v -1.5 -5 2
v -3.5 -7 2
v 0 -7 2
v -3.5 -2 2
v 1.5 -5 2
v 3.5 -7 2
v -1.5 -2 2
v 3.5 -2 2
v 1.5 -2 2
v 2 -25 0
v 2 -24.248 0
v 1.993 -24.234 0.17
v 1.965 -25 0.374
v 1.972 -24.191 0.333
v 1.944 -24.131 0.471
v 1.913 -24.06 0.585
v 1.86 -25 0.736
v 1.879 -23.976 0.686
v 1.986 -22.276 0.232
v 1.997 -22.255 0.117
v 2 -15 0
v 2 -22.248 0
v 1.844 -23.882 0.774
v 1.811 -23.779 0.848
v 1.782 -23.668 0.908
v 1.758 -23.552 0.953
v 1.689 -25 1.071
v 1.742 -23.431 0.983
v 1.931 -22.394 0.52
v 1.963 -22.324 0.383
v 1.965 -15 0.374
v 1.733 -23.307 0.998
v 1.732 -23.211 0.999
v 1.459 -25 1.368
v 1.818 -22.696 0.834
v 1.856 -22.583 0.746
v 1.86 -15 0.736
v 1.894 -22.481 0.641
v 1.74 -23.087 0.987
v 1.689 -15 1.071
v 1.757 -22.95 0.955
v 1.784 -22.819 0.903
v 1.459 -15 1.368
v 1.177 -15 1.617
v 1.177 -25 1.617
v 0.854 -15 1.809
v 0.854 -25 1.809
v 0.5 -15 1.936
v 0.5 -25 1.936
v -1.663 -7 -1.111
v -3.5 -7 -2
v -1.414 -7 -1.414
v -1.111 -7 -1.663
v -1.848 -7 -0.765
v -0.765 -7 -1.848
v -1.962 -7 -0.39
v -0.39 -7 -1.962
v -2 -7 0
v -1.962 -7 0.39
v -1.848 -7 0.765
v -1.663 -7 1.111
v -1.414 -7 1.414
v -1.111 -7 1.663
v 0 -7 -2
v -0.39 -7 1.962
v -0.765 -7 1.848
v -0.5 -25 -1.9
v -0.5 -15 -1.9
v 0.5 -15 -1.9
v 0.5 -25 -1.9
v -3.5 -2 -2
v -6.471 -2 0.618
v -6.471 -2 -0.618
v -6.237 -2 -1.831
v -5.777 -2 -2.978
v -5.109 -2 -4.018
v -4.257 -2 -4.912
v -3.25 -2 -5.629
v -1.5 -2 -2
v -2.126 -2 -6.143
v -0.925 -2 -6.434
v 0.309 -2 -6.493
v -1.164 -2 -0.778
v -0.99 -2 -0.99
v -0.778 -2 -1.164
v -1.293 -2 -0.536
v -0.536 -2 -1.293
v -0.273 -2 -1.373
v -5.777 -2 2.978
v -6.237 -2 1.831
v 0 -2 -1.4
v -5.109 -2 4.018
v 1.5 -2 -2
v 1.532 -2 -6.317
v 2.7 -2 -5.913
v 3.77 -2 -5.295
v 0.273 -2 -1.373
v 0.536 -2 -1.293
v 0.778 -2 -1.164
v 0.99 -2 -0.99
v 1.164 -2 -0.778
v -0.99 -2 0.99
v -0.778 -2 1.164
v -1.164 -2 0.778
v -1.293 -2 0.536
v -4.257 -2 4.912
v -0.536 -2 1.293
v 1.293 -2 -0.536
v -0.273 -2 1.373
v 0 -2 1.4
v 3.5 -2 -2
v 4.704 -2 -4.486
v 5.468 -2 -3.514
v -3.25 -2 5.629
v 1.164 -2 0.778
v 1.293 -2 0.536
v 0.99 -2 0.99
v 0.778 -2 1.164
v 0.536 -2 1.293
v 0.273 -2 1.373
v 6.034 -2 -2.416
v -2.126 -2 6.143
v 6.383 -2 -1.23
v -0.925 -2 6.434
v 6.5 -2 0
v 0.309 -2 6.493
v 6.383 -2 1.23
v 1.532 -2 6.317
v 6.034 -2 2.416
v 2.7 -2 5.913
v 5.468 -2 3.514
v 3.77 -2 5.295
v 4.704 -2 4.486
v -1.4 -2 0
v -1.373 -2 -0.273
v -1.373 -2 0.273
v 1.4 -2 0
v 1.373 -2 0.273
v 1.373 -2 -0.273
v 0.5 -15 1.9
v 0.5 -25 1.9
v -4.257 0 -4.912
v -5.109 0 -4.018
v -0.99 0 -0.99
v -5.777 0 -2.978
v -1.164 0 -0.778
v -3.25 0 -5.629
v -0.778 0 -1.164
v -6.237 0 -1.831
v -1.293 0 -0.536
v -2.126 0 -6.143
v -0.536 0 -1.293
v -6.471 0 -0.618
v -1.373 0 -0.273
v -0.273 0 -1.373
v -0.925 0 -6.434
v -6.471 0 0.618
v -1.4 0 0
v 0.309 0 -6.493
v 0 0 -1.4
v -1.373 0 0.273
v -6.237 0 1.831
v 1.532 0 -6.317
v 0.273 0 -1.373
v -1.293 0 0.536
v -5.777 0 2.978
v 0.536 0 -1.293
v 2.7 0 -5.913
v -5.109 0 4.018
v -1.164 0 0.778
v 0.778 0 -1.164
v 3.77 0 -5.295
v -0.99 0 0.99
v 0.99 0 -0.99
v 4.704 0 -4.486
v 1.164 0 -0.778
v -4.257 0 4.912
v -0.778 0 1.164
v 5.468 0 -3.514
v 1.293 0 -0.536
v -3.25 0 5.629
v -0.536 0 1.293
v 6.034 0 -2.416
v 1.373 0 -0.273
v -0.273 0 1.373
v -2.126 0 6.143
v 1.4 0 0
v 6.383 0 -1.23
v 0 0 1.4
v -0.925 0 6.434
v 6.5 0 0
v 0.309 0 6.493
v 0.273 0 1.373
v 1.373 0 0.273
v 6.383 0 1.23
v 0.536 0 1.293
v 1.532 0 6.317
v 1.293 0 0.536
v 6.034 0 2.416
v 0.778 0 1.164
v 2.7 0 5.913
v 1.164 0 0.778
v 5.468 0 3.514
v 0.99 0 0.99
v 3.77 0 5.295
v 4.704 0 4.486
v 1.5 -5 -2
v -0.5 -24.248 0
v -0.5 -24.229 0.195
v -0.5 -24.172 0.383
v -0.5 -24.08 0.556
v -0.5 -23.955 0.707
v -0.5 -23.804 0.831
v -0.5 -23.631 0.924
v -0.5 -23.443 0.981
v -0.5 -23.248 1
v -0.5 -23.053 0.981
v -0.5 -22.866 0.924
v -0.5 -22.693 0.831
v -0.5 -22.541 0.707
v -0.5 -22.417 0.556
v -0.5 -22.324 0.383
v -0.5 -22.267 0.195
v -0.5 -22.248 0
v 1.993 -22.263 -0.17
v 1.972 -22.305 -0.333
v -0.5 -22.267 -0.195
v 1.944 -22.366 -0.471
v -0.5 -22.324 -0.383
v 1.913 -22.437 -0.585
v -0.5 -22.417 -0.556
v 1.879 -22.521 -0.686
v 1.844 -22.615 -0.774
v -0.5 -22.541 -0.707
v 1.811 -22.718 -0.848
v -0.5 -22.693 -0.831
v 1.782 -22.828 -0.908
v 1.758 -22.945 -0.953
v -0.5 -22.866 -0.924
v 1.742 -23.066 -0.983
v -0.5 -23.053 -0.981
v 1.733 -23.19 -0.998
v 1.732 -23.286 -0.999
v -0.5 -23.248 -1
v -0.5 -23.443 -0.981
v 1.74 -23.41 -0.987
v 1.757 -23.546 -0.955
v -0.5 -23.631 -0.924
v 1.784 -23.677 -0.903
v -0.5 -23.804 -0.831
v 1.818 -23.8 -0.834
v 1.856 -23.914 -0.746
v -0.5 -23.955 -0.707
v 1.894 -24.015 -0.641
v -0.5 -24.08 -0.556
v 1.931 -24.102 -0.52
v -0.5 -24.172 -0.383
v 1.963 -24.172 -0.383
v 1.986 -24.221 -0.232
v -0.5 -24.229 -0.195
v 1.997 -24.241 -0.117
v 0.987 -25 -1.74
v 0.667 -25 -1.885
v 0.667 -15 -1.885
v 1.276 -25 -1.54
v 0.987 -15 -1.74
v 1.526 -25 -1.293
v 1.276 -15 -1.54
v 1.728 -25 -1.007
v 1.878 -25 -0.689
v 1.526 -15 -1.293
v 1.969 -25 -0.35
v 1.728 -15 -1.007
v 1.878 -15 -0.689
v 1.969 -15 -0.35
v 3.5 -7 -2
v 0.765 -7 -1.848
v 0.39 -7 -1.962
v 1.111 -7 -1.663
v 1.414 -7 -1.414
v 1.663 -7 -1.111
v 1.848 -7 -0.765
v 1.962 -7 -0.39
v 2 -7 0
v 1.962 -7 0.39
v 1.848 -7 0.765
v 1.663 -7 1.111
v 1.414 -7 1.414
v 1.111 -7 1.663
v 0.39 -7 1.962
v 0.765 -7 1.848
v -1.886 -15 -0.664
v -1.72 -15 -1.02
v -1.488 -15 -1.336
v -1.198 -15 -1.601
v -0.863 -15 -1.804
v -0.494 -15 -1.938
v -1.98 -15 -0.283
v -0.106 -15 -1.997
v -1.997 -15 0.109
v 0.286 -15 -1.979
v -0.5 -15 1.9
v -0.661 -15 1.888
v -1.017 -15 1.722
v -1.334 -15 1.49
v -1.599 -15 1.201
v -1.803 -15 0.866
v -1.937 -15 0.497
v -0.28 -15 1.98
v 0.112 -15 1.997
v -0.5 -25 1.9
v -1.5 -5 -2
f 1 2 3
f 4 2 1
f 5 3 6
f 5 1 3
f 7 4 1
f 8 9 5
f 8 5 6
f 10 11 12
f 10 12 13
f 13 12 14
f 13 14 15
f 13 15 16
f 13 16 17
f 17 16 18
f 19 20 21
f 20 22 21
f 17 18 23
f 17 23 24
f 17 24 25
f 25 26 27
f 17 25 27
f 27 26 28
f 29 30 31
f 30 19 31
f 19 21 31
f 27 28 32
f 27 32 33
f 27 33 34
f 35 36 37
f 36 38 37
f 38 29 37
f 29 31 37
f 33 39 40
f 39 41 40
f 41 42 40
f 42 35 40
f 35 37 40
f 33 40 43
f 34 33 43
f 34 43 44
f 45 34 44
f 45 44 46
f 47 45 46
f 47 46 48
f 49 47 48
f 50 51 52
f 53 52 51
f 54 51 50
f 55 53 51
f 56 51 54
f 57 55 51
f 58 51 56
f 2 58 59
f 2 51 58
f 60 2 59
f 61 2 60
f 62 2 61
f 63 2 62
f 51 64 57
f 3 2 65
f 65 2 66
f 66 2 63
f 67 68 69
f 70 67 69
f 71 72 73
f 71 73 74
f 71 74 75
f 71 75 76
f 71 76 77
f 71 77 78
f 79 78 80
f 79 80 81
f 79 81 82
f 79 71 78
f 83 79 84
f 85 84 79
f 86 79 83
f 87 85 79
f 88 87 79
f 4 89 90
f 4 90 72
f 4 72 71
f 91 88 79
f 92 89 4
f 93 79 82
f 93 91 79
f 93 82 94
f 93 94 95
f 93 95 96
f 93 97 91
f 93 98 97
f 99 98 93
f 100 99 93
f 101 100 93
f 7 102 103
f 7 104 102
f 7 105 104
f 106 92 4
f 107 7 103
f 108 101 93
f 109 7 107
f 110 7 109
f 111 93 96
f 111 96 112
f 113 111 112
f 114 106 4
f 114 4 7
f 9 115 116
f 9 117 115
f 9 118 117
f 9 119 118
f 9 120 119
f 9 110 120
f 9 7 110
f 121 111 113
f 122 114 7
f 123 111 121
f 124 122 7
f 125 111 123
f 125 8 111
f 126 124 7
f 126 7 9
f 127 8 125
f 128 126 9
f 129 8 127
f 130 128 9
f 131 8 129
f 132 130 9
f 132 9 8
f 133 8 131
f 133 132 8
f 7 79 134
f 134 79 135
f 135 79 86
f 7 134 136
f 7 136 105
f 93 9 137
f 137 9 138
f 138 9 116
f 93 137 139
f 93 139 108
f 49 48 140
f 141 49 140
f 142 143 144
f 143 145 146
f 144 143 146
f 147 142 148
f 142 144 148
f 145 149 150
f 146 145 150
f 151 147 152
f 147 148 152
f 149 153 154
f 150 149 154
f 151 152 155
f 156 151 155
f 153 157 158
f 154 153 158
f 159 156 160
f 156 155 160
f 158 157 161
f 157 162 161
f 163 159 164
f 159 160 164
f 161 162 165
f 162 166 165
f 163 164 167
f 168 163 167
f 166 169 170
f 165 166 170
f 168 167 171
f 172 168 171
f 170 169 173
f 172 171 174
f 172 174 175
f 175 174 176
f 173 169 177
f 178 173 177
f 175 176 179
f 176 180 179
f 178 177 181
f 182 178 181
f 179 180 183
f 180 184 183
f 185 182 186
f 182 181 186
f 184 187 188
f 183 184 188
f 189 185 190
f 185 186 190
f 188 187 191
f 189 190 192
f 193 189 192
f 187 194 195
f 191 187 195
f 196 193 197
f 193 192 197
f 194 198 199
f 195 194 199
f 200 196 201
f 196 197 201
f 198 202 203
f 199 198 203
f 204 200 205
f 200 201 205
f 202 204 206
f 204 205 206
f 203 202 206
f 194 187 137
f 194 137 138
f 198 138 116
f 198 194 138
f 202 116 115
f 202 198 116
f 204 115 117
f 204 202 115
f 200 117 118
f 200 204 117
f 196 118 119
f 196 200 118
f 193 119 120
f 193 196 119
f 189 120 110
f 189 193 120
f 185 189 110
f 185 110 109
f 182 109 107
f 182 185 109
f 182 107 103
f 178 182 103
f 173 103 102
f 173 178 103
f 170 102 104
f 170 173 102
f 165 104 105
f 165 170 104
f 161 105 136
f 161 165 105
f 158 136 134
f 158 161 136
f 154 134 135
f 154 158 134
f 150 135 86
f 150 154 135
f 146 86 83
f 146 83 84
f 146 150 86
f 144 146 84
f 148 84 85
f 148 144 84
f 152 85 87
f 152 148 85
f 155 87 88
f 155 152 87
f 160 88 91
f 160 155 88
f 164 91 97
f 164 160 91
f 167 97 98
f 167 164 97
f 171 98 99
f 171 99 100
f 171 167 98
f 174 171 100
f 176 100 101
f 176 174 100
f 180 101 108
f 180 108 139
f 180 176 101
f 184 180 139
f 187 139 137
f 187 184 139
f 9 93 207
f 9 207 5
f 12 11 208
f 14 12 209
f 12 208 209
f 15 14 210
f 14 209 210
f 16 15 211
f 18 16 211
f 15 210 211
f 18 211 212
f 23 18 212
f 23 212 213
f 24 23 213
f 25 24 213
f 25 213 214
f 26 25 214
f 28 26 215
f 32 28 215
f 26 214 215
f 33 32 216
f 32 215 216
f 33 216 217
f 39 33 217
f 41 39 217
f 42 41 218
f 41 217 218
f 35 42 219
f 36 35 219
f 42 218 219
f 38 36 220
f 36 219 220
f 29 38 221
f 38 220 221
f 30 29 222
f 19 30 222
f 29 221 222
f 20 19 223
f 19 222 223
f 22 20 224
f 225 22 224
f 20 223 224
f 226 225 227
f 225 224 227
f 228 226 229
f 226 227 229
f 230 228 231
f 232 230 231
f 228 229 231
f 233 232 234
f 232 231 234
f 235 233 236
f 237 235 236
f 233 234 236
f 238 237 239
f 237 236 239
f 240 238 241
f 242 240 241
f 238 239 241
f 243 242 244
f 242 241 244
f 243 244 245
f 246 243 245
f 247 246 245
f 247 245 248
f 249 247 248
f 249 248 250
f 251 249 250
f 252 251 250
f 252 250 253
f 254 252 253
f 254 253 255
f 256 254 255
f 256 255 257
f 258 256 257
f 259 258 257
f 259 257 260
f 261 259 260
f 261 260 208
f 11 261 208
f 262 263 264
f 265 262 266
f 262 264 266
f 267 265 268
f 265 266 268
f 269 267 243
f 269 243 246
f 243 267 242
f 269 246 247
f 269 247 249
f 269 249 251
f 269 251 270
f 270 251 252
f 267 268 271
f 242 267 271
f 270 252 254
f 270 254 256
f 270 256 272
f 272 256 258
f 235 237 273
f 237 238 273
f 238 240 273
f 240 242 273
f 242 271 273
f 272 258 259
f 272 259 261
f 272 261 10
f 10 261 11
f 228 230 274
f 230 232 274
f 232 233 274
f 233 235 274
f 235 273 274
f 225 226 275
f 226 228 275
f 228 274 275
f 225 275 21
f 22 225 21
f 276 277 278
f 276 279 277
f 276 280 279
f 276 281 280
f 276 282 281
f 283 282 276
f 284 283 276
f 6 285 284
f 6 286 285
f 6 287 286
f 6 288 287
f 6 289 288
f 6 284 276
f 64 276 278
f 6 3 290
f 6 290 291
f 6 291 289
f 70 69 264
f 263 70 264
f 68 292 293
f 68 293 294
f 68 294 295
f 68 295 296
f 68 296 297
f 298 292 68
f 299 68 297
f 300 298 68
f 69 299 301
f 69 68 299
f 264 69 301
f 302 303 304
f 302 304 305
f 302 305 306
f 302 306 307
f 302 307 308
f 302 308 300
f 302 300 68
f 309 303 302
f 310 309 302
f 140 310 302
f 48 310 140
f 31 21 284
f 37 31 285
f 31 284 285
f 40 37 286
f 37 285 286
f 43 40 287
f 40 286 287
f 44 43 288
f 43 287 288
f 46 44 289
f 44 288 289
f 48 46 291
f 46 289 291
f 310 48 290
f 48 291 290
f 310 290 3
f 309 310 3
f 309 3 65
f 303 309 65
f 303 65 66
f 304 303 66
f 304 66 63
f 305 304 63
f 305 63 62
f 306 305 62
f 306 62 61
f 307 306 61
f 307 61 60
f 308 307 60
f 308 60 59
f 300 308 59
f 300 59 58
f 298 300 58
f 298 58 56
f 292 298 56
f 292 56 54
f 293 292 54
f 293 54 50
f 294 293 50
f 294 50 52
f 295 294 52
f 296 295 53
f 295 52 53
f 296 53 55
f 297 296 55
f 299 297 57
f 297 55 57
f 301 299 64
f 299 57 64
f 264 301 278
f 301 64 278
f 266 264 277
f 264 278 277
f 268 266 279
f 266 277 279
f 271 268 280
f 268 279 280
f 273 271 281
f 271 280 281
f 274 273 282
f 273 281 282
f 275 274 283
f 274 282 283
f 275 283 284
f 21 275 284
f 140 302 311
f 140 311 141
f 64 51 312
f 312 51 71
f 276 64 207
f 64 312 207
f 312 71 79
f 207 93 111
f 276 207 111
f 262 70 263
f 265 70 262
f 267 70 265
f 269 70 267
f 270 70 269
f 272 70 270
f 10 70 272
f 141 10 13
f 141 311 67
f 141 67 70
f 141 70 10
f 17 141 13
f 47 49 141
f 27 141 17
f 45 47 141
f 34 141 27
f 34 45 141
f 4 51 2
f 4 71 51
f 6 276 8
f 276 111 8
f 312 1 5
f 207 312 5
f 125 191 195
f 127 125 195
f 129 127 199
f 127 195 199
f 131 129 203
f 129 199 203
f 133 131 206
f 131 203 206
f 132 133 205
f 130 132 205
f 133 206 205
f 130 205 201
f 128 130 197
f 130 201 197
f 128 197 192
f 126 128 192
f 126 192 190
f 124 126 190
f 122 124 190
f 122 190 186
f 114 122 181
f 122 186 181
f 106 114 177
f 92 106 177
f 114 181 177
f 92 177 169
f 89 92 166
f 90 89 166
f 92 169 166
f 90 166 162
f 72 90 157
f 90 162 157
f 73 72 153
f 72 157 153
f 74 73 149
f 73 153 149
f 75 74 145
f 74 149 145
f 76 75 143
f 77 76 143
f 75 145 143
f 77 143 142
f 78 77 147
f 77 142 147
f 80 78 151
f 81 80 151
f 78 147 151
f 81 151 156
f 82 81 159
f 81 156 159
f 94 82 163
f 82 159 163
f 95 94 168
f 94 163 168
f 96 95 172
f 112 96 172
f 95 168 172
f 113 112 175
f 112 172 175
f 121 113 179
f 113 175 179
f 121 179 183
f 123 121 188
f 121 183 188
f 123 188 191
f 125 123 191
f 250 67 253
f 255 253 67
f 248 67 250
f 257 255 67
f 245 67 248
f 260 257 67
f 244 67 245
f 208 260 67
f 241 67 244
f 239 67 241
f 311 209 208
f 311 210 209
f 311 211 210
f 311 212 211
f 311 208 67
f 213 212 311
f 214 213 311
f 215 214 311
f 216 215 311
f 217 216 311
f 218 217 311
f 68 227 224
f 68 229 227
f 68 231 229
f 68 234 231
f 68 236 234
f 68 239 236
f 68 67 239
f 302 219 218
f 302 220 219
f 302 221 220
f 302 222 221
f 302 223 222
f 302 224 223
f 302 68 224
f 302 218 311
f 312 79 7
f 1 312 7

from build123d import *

# Parameters (mm, degrees)
F0_R      = 6.5
F0_W      = 2
F0_H      = 4
F0_R_2    = 1.4
F1_DEPTH  = 2
F2_DEPTH  = 5
F3_W      = 7
F3_H      = 4
F4_DEPTH  = 2
F5_R      = 2
F6_DEPTH  = 8
F7_W      = 1
F7_H      = 3.8
F8_DEPTH  = 10
F9_R      = 1
F10_DEPTH = 3.46
F11_DEPTH = 10
F12_DEPTH = 2.95


with BuildPart() as f1:
    # F0 (on Front) → F1 (new body)
    with BuildSketch(Plane.XZ):
        Circle(F0_R)
        with Locations((-2.5, 0)):
            Rectangle(F0_W, F0_H, mode=Mode.SUBTRACT)
        Circle(F0_R_2, mode=Mode.SUBTRACT)
        with Locations((2.5, 0)):
            Rectangle(F0_W, F0_H, mode=Mode.SUBTRACT)
    extrude(amount=F1_DEPTH)

    # F0 (on Front) → F2 (join)
    with BuildSketch(Plane.XZ):
        with Locations((-2.5, 0)):
            Rectangle(F0_W, F0_H)
        with Locations((2.5, 0)):
            Rectangle(F0_W, F0_H)
    extrude(amount=F2_DEPTH)

    # F3 (on face) → F4 (join)
    with BuildSketch(Plane.XZ.offset(5)):
        Rectangle(F3_W, F3_H)
    extrude(amount=F4_DEPTH)

    # F5 (on face) → F6 (join)
    with BuildSketch(Plane.XZ.offset(7)):
        Circle(F5_R)
    extrude(amount=F6_DEPTH)

    # F7 (on face) → F8 (join)
    with BuildSketch(Plane.XZ.offset(15)):
        Rectangle(F7_W, F7_H)
    extrude(amount=F8_DEPTH)

    # F9 (on face) → F10 (cut)
    with BuildSketch(Plane(origin=(-0.5, 0, 0), x_dir=(0, -1, 0), z_dir=(-1, 0, 0))):
        with Locations((23.2482682914, 0)):
            Circle(F9_R)
    extrude(amount=-F10_DEPTH, mode=Mode.SUBTRACT)

    # F7 (on face) → F11 (join)
    with BuildSketch(Plane.XZ.offset(15)):
        with BuildLine():
            Line((0.5, 1.9), (0.5, -1.9))
            Line((0.5, -1.9), (0.667421366, -1.8853510867))
            ThreePointArc((0.667421366, -1.8853510867), (1.633224224, -1.1543736977), (2, 0))
            ThreePointArc((2, 0), (1.5811388301, 1.2247448714), (0.5, 1.9364916731))
            Line((0.5, 1.9364916731), (0.5, 1.9))
        make_face()
    extrude(amount=F11_DEPTH)

    # F12 (cut): a face of the model
    f12_faces = [f1.faces().sort_by_distance(p)[0] for p in [
        (0.5, -23.2482682914, 0),
    ]]
    extrude(f12_faces, amount=-F12_DEPTH, mode=Mode.SUBTRACT)


solid = f1.part
